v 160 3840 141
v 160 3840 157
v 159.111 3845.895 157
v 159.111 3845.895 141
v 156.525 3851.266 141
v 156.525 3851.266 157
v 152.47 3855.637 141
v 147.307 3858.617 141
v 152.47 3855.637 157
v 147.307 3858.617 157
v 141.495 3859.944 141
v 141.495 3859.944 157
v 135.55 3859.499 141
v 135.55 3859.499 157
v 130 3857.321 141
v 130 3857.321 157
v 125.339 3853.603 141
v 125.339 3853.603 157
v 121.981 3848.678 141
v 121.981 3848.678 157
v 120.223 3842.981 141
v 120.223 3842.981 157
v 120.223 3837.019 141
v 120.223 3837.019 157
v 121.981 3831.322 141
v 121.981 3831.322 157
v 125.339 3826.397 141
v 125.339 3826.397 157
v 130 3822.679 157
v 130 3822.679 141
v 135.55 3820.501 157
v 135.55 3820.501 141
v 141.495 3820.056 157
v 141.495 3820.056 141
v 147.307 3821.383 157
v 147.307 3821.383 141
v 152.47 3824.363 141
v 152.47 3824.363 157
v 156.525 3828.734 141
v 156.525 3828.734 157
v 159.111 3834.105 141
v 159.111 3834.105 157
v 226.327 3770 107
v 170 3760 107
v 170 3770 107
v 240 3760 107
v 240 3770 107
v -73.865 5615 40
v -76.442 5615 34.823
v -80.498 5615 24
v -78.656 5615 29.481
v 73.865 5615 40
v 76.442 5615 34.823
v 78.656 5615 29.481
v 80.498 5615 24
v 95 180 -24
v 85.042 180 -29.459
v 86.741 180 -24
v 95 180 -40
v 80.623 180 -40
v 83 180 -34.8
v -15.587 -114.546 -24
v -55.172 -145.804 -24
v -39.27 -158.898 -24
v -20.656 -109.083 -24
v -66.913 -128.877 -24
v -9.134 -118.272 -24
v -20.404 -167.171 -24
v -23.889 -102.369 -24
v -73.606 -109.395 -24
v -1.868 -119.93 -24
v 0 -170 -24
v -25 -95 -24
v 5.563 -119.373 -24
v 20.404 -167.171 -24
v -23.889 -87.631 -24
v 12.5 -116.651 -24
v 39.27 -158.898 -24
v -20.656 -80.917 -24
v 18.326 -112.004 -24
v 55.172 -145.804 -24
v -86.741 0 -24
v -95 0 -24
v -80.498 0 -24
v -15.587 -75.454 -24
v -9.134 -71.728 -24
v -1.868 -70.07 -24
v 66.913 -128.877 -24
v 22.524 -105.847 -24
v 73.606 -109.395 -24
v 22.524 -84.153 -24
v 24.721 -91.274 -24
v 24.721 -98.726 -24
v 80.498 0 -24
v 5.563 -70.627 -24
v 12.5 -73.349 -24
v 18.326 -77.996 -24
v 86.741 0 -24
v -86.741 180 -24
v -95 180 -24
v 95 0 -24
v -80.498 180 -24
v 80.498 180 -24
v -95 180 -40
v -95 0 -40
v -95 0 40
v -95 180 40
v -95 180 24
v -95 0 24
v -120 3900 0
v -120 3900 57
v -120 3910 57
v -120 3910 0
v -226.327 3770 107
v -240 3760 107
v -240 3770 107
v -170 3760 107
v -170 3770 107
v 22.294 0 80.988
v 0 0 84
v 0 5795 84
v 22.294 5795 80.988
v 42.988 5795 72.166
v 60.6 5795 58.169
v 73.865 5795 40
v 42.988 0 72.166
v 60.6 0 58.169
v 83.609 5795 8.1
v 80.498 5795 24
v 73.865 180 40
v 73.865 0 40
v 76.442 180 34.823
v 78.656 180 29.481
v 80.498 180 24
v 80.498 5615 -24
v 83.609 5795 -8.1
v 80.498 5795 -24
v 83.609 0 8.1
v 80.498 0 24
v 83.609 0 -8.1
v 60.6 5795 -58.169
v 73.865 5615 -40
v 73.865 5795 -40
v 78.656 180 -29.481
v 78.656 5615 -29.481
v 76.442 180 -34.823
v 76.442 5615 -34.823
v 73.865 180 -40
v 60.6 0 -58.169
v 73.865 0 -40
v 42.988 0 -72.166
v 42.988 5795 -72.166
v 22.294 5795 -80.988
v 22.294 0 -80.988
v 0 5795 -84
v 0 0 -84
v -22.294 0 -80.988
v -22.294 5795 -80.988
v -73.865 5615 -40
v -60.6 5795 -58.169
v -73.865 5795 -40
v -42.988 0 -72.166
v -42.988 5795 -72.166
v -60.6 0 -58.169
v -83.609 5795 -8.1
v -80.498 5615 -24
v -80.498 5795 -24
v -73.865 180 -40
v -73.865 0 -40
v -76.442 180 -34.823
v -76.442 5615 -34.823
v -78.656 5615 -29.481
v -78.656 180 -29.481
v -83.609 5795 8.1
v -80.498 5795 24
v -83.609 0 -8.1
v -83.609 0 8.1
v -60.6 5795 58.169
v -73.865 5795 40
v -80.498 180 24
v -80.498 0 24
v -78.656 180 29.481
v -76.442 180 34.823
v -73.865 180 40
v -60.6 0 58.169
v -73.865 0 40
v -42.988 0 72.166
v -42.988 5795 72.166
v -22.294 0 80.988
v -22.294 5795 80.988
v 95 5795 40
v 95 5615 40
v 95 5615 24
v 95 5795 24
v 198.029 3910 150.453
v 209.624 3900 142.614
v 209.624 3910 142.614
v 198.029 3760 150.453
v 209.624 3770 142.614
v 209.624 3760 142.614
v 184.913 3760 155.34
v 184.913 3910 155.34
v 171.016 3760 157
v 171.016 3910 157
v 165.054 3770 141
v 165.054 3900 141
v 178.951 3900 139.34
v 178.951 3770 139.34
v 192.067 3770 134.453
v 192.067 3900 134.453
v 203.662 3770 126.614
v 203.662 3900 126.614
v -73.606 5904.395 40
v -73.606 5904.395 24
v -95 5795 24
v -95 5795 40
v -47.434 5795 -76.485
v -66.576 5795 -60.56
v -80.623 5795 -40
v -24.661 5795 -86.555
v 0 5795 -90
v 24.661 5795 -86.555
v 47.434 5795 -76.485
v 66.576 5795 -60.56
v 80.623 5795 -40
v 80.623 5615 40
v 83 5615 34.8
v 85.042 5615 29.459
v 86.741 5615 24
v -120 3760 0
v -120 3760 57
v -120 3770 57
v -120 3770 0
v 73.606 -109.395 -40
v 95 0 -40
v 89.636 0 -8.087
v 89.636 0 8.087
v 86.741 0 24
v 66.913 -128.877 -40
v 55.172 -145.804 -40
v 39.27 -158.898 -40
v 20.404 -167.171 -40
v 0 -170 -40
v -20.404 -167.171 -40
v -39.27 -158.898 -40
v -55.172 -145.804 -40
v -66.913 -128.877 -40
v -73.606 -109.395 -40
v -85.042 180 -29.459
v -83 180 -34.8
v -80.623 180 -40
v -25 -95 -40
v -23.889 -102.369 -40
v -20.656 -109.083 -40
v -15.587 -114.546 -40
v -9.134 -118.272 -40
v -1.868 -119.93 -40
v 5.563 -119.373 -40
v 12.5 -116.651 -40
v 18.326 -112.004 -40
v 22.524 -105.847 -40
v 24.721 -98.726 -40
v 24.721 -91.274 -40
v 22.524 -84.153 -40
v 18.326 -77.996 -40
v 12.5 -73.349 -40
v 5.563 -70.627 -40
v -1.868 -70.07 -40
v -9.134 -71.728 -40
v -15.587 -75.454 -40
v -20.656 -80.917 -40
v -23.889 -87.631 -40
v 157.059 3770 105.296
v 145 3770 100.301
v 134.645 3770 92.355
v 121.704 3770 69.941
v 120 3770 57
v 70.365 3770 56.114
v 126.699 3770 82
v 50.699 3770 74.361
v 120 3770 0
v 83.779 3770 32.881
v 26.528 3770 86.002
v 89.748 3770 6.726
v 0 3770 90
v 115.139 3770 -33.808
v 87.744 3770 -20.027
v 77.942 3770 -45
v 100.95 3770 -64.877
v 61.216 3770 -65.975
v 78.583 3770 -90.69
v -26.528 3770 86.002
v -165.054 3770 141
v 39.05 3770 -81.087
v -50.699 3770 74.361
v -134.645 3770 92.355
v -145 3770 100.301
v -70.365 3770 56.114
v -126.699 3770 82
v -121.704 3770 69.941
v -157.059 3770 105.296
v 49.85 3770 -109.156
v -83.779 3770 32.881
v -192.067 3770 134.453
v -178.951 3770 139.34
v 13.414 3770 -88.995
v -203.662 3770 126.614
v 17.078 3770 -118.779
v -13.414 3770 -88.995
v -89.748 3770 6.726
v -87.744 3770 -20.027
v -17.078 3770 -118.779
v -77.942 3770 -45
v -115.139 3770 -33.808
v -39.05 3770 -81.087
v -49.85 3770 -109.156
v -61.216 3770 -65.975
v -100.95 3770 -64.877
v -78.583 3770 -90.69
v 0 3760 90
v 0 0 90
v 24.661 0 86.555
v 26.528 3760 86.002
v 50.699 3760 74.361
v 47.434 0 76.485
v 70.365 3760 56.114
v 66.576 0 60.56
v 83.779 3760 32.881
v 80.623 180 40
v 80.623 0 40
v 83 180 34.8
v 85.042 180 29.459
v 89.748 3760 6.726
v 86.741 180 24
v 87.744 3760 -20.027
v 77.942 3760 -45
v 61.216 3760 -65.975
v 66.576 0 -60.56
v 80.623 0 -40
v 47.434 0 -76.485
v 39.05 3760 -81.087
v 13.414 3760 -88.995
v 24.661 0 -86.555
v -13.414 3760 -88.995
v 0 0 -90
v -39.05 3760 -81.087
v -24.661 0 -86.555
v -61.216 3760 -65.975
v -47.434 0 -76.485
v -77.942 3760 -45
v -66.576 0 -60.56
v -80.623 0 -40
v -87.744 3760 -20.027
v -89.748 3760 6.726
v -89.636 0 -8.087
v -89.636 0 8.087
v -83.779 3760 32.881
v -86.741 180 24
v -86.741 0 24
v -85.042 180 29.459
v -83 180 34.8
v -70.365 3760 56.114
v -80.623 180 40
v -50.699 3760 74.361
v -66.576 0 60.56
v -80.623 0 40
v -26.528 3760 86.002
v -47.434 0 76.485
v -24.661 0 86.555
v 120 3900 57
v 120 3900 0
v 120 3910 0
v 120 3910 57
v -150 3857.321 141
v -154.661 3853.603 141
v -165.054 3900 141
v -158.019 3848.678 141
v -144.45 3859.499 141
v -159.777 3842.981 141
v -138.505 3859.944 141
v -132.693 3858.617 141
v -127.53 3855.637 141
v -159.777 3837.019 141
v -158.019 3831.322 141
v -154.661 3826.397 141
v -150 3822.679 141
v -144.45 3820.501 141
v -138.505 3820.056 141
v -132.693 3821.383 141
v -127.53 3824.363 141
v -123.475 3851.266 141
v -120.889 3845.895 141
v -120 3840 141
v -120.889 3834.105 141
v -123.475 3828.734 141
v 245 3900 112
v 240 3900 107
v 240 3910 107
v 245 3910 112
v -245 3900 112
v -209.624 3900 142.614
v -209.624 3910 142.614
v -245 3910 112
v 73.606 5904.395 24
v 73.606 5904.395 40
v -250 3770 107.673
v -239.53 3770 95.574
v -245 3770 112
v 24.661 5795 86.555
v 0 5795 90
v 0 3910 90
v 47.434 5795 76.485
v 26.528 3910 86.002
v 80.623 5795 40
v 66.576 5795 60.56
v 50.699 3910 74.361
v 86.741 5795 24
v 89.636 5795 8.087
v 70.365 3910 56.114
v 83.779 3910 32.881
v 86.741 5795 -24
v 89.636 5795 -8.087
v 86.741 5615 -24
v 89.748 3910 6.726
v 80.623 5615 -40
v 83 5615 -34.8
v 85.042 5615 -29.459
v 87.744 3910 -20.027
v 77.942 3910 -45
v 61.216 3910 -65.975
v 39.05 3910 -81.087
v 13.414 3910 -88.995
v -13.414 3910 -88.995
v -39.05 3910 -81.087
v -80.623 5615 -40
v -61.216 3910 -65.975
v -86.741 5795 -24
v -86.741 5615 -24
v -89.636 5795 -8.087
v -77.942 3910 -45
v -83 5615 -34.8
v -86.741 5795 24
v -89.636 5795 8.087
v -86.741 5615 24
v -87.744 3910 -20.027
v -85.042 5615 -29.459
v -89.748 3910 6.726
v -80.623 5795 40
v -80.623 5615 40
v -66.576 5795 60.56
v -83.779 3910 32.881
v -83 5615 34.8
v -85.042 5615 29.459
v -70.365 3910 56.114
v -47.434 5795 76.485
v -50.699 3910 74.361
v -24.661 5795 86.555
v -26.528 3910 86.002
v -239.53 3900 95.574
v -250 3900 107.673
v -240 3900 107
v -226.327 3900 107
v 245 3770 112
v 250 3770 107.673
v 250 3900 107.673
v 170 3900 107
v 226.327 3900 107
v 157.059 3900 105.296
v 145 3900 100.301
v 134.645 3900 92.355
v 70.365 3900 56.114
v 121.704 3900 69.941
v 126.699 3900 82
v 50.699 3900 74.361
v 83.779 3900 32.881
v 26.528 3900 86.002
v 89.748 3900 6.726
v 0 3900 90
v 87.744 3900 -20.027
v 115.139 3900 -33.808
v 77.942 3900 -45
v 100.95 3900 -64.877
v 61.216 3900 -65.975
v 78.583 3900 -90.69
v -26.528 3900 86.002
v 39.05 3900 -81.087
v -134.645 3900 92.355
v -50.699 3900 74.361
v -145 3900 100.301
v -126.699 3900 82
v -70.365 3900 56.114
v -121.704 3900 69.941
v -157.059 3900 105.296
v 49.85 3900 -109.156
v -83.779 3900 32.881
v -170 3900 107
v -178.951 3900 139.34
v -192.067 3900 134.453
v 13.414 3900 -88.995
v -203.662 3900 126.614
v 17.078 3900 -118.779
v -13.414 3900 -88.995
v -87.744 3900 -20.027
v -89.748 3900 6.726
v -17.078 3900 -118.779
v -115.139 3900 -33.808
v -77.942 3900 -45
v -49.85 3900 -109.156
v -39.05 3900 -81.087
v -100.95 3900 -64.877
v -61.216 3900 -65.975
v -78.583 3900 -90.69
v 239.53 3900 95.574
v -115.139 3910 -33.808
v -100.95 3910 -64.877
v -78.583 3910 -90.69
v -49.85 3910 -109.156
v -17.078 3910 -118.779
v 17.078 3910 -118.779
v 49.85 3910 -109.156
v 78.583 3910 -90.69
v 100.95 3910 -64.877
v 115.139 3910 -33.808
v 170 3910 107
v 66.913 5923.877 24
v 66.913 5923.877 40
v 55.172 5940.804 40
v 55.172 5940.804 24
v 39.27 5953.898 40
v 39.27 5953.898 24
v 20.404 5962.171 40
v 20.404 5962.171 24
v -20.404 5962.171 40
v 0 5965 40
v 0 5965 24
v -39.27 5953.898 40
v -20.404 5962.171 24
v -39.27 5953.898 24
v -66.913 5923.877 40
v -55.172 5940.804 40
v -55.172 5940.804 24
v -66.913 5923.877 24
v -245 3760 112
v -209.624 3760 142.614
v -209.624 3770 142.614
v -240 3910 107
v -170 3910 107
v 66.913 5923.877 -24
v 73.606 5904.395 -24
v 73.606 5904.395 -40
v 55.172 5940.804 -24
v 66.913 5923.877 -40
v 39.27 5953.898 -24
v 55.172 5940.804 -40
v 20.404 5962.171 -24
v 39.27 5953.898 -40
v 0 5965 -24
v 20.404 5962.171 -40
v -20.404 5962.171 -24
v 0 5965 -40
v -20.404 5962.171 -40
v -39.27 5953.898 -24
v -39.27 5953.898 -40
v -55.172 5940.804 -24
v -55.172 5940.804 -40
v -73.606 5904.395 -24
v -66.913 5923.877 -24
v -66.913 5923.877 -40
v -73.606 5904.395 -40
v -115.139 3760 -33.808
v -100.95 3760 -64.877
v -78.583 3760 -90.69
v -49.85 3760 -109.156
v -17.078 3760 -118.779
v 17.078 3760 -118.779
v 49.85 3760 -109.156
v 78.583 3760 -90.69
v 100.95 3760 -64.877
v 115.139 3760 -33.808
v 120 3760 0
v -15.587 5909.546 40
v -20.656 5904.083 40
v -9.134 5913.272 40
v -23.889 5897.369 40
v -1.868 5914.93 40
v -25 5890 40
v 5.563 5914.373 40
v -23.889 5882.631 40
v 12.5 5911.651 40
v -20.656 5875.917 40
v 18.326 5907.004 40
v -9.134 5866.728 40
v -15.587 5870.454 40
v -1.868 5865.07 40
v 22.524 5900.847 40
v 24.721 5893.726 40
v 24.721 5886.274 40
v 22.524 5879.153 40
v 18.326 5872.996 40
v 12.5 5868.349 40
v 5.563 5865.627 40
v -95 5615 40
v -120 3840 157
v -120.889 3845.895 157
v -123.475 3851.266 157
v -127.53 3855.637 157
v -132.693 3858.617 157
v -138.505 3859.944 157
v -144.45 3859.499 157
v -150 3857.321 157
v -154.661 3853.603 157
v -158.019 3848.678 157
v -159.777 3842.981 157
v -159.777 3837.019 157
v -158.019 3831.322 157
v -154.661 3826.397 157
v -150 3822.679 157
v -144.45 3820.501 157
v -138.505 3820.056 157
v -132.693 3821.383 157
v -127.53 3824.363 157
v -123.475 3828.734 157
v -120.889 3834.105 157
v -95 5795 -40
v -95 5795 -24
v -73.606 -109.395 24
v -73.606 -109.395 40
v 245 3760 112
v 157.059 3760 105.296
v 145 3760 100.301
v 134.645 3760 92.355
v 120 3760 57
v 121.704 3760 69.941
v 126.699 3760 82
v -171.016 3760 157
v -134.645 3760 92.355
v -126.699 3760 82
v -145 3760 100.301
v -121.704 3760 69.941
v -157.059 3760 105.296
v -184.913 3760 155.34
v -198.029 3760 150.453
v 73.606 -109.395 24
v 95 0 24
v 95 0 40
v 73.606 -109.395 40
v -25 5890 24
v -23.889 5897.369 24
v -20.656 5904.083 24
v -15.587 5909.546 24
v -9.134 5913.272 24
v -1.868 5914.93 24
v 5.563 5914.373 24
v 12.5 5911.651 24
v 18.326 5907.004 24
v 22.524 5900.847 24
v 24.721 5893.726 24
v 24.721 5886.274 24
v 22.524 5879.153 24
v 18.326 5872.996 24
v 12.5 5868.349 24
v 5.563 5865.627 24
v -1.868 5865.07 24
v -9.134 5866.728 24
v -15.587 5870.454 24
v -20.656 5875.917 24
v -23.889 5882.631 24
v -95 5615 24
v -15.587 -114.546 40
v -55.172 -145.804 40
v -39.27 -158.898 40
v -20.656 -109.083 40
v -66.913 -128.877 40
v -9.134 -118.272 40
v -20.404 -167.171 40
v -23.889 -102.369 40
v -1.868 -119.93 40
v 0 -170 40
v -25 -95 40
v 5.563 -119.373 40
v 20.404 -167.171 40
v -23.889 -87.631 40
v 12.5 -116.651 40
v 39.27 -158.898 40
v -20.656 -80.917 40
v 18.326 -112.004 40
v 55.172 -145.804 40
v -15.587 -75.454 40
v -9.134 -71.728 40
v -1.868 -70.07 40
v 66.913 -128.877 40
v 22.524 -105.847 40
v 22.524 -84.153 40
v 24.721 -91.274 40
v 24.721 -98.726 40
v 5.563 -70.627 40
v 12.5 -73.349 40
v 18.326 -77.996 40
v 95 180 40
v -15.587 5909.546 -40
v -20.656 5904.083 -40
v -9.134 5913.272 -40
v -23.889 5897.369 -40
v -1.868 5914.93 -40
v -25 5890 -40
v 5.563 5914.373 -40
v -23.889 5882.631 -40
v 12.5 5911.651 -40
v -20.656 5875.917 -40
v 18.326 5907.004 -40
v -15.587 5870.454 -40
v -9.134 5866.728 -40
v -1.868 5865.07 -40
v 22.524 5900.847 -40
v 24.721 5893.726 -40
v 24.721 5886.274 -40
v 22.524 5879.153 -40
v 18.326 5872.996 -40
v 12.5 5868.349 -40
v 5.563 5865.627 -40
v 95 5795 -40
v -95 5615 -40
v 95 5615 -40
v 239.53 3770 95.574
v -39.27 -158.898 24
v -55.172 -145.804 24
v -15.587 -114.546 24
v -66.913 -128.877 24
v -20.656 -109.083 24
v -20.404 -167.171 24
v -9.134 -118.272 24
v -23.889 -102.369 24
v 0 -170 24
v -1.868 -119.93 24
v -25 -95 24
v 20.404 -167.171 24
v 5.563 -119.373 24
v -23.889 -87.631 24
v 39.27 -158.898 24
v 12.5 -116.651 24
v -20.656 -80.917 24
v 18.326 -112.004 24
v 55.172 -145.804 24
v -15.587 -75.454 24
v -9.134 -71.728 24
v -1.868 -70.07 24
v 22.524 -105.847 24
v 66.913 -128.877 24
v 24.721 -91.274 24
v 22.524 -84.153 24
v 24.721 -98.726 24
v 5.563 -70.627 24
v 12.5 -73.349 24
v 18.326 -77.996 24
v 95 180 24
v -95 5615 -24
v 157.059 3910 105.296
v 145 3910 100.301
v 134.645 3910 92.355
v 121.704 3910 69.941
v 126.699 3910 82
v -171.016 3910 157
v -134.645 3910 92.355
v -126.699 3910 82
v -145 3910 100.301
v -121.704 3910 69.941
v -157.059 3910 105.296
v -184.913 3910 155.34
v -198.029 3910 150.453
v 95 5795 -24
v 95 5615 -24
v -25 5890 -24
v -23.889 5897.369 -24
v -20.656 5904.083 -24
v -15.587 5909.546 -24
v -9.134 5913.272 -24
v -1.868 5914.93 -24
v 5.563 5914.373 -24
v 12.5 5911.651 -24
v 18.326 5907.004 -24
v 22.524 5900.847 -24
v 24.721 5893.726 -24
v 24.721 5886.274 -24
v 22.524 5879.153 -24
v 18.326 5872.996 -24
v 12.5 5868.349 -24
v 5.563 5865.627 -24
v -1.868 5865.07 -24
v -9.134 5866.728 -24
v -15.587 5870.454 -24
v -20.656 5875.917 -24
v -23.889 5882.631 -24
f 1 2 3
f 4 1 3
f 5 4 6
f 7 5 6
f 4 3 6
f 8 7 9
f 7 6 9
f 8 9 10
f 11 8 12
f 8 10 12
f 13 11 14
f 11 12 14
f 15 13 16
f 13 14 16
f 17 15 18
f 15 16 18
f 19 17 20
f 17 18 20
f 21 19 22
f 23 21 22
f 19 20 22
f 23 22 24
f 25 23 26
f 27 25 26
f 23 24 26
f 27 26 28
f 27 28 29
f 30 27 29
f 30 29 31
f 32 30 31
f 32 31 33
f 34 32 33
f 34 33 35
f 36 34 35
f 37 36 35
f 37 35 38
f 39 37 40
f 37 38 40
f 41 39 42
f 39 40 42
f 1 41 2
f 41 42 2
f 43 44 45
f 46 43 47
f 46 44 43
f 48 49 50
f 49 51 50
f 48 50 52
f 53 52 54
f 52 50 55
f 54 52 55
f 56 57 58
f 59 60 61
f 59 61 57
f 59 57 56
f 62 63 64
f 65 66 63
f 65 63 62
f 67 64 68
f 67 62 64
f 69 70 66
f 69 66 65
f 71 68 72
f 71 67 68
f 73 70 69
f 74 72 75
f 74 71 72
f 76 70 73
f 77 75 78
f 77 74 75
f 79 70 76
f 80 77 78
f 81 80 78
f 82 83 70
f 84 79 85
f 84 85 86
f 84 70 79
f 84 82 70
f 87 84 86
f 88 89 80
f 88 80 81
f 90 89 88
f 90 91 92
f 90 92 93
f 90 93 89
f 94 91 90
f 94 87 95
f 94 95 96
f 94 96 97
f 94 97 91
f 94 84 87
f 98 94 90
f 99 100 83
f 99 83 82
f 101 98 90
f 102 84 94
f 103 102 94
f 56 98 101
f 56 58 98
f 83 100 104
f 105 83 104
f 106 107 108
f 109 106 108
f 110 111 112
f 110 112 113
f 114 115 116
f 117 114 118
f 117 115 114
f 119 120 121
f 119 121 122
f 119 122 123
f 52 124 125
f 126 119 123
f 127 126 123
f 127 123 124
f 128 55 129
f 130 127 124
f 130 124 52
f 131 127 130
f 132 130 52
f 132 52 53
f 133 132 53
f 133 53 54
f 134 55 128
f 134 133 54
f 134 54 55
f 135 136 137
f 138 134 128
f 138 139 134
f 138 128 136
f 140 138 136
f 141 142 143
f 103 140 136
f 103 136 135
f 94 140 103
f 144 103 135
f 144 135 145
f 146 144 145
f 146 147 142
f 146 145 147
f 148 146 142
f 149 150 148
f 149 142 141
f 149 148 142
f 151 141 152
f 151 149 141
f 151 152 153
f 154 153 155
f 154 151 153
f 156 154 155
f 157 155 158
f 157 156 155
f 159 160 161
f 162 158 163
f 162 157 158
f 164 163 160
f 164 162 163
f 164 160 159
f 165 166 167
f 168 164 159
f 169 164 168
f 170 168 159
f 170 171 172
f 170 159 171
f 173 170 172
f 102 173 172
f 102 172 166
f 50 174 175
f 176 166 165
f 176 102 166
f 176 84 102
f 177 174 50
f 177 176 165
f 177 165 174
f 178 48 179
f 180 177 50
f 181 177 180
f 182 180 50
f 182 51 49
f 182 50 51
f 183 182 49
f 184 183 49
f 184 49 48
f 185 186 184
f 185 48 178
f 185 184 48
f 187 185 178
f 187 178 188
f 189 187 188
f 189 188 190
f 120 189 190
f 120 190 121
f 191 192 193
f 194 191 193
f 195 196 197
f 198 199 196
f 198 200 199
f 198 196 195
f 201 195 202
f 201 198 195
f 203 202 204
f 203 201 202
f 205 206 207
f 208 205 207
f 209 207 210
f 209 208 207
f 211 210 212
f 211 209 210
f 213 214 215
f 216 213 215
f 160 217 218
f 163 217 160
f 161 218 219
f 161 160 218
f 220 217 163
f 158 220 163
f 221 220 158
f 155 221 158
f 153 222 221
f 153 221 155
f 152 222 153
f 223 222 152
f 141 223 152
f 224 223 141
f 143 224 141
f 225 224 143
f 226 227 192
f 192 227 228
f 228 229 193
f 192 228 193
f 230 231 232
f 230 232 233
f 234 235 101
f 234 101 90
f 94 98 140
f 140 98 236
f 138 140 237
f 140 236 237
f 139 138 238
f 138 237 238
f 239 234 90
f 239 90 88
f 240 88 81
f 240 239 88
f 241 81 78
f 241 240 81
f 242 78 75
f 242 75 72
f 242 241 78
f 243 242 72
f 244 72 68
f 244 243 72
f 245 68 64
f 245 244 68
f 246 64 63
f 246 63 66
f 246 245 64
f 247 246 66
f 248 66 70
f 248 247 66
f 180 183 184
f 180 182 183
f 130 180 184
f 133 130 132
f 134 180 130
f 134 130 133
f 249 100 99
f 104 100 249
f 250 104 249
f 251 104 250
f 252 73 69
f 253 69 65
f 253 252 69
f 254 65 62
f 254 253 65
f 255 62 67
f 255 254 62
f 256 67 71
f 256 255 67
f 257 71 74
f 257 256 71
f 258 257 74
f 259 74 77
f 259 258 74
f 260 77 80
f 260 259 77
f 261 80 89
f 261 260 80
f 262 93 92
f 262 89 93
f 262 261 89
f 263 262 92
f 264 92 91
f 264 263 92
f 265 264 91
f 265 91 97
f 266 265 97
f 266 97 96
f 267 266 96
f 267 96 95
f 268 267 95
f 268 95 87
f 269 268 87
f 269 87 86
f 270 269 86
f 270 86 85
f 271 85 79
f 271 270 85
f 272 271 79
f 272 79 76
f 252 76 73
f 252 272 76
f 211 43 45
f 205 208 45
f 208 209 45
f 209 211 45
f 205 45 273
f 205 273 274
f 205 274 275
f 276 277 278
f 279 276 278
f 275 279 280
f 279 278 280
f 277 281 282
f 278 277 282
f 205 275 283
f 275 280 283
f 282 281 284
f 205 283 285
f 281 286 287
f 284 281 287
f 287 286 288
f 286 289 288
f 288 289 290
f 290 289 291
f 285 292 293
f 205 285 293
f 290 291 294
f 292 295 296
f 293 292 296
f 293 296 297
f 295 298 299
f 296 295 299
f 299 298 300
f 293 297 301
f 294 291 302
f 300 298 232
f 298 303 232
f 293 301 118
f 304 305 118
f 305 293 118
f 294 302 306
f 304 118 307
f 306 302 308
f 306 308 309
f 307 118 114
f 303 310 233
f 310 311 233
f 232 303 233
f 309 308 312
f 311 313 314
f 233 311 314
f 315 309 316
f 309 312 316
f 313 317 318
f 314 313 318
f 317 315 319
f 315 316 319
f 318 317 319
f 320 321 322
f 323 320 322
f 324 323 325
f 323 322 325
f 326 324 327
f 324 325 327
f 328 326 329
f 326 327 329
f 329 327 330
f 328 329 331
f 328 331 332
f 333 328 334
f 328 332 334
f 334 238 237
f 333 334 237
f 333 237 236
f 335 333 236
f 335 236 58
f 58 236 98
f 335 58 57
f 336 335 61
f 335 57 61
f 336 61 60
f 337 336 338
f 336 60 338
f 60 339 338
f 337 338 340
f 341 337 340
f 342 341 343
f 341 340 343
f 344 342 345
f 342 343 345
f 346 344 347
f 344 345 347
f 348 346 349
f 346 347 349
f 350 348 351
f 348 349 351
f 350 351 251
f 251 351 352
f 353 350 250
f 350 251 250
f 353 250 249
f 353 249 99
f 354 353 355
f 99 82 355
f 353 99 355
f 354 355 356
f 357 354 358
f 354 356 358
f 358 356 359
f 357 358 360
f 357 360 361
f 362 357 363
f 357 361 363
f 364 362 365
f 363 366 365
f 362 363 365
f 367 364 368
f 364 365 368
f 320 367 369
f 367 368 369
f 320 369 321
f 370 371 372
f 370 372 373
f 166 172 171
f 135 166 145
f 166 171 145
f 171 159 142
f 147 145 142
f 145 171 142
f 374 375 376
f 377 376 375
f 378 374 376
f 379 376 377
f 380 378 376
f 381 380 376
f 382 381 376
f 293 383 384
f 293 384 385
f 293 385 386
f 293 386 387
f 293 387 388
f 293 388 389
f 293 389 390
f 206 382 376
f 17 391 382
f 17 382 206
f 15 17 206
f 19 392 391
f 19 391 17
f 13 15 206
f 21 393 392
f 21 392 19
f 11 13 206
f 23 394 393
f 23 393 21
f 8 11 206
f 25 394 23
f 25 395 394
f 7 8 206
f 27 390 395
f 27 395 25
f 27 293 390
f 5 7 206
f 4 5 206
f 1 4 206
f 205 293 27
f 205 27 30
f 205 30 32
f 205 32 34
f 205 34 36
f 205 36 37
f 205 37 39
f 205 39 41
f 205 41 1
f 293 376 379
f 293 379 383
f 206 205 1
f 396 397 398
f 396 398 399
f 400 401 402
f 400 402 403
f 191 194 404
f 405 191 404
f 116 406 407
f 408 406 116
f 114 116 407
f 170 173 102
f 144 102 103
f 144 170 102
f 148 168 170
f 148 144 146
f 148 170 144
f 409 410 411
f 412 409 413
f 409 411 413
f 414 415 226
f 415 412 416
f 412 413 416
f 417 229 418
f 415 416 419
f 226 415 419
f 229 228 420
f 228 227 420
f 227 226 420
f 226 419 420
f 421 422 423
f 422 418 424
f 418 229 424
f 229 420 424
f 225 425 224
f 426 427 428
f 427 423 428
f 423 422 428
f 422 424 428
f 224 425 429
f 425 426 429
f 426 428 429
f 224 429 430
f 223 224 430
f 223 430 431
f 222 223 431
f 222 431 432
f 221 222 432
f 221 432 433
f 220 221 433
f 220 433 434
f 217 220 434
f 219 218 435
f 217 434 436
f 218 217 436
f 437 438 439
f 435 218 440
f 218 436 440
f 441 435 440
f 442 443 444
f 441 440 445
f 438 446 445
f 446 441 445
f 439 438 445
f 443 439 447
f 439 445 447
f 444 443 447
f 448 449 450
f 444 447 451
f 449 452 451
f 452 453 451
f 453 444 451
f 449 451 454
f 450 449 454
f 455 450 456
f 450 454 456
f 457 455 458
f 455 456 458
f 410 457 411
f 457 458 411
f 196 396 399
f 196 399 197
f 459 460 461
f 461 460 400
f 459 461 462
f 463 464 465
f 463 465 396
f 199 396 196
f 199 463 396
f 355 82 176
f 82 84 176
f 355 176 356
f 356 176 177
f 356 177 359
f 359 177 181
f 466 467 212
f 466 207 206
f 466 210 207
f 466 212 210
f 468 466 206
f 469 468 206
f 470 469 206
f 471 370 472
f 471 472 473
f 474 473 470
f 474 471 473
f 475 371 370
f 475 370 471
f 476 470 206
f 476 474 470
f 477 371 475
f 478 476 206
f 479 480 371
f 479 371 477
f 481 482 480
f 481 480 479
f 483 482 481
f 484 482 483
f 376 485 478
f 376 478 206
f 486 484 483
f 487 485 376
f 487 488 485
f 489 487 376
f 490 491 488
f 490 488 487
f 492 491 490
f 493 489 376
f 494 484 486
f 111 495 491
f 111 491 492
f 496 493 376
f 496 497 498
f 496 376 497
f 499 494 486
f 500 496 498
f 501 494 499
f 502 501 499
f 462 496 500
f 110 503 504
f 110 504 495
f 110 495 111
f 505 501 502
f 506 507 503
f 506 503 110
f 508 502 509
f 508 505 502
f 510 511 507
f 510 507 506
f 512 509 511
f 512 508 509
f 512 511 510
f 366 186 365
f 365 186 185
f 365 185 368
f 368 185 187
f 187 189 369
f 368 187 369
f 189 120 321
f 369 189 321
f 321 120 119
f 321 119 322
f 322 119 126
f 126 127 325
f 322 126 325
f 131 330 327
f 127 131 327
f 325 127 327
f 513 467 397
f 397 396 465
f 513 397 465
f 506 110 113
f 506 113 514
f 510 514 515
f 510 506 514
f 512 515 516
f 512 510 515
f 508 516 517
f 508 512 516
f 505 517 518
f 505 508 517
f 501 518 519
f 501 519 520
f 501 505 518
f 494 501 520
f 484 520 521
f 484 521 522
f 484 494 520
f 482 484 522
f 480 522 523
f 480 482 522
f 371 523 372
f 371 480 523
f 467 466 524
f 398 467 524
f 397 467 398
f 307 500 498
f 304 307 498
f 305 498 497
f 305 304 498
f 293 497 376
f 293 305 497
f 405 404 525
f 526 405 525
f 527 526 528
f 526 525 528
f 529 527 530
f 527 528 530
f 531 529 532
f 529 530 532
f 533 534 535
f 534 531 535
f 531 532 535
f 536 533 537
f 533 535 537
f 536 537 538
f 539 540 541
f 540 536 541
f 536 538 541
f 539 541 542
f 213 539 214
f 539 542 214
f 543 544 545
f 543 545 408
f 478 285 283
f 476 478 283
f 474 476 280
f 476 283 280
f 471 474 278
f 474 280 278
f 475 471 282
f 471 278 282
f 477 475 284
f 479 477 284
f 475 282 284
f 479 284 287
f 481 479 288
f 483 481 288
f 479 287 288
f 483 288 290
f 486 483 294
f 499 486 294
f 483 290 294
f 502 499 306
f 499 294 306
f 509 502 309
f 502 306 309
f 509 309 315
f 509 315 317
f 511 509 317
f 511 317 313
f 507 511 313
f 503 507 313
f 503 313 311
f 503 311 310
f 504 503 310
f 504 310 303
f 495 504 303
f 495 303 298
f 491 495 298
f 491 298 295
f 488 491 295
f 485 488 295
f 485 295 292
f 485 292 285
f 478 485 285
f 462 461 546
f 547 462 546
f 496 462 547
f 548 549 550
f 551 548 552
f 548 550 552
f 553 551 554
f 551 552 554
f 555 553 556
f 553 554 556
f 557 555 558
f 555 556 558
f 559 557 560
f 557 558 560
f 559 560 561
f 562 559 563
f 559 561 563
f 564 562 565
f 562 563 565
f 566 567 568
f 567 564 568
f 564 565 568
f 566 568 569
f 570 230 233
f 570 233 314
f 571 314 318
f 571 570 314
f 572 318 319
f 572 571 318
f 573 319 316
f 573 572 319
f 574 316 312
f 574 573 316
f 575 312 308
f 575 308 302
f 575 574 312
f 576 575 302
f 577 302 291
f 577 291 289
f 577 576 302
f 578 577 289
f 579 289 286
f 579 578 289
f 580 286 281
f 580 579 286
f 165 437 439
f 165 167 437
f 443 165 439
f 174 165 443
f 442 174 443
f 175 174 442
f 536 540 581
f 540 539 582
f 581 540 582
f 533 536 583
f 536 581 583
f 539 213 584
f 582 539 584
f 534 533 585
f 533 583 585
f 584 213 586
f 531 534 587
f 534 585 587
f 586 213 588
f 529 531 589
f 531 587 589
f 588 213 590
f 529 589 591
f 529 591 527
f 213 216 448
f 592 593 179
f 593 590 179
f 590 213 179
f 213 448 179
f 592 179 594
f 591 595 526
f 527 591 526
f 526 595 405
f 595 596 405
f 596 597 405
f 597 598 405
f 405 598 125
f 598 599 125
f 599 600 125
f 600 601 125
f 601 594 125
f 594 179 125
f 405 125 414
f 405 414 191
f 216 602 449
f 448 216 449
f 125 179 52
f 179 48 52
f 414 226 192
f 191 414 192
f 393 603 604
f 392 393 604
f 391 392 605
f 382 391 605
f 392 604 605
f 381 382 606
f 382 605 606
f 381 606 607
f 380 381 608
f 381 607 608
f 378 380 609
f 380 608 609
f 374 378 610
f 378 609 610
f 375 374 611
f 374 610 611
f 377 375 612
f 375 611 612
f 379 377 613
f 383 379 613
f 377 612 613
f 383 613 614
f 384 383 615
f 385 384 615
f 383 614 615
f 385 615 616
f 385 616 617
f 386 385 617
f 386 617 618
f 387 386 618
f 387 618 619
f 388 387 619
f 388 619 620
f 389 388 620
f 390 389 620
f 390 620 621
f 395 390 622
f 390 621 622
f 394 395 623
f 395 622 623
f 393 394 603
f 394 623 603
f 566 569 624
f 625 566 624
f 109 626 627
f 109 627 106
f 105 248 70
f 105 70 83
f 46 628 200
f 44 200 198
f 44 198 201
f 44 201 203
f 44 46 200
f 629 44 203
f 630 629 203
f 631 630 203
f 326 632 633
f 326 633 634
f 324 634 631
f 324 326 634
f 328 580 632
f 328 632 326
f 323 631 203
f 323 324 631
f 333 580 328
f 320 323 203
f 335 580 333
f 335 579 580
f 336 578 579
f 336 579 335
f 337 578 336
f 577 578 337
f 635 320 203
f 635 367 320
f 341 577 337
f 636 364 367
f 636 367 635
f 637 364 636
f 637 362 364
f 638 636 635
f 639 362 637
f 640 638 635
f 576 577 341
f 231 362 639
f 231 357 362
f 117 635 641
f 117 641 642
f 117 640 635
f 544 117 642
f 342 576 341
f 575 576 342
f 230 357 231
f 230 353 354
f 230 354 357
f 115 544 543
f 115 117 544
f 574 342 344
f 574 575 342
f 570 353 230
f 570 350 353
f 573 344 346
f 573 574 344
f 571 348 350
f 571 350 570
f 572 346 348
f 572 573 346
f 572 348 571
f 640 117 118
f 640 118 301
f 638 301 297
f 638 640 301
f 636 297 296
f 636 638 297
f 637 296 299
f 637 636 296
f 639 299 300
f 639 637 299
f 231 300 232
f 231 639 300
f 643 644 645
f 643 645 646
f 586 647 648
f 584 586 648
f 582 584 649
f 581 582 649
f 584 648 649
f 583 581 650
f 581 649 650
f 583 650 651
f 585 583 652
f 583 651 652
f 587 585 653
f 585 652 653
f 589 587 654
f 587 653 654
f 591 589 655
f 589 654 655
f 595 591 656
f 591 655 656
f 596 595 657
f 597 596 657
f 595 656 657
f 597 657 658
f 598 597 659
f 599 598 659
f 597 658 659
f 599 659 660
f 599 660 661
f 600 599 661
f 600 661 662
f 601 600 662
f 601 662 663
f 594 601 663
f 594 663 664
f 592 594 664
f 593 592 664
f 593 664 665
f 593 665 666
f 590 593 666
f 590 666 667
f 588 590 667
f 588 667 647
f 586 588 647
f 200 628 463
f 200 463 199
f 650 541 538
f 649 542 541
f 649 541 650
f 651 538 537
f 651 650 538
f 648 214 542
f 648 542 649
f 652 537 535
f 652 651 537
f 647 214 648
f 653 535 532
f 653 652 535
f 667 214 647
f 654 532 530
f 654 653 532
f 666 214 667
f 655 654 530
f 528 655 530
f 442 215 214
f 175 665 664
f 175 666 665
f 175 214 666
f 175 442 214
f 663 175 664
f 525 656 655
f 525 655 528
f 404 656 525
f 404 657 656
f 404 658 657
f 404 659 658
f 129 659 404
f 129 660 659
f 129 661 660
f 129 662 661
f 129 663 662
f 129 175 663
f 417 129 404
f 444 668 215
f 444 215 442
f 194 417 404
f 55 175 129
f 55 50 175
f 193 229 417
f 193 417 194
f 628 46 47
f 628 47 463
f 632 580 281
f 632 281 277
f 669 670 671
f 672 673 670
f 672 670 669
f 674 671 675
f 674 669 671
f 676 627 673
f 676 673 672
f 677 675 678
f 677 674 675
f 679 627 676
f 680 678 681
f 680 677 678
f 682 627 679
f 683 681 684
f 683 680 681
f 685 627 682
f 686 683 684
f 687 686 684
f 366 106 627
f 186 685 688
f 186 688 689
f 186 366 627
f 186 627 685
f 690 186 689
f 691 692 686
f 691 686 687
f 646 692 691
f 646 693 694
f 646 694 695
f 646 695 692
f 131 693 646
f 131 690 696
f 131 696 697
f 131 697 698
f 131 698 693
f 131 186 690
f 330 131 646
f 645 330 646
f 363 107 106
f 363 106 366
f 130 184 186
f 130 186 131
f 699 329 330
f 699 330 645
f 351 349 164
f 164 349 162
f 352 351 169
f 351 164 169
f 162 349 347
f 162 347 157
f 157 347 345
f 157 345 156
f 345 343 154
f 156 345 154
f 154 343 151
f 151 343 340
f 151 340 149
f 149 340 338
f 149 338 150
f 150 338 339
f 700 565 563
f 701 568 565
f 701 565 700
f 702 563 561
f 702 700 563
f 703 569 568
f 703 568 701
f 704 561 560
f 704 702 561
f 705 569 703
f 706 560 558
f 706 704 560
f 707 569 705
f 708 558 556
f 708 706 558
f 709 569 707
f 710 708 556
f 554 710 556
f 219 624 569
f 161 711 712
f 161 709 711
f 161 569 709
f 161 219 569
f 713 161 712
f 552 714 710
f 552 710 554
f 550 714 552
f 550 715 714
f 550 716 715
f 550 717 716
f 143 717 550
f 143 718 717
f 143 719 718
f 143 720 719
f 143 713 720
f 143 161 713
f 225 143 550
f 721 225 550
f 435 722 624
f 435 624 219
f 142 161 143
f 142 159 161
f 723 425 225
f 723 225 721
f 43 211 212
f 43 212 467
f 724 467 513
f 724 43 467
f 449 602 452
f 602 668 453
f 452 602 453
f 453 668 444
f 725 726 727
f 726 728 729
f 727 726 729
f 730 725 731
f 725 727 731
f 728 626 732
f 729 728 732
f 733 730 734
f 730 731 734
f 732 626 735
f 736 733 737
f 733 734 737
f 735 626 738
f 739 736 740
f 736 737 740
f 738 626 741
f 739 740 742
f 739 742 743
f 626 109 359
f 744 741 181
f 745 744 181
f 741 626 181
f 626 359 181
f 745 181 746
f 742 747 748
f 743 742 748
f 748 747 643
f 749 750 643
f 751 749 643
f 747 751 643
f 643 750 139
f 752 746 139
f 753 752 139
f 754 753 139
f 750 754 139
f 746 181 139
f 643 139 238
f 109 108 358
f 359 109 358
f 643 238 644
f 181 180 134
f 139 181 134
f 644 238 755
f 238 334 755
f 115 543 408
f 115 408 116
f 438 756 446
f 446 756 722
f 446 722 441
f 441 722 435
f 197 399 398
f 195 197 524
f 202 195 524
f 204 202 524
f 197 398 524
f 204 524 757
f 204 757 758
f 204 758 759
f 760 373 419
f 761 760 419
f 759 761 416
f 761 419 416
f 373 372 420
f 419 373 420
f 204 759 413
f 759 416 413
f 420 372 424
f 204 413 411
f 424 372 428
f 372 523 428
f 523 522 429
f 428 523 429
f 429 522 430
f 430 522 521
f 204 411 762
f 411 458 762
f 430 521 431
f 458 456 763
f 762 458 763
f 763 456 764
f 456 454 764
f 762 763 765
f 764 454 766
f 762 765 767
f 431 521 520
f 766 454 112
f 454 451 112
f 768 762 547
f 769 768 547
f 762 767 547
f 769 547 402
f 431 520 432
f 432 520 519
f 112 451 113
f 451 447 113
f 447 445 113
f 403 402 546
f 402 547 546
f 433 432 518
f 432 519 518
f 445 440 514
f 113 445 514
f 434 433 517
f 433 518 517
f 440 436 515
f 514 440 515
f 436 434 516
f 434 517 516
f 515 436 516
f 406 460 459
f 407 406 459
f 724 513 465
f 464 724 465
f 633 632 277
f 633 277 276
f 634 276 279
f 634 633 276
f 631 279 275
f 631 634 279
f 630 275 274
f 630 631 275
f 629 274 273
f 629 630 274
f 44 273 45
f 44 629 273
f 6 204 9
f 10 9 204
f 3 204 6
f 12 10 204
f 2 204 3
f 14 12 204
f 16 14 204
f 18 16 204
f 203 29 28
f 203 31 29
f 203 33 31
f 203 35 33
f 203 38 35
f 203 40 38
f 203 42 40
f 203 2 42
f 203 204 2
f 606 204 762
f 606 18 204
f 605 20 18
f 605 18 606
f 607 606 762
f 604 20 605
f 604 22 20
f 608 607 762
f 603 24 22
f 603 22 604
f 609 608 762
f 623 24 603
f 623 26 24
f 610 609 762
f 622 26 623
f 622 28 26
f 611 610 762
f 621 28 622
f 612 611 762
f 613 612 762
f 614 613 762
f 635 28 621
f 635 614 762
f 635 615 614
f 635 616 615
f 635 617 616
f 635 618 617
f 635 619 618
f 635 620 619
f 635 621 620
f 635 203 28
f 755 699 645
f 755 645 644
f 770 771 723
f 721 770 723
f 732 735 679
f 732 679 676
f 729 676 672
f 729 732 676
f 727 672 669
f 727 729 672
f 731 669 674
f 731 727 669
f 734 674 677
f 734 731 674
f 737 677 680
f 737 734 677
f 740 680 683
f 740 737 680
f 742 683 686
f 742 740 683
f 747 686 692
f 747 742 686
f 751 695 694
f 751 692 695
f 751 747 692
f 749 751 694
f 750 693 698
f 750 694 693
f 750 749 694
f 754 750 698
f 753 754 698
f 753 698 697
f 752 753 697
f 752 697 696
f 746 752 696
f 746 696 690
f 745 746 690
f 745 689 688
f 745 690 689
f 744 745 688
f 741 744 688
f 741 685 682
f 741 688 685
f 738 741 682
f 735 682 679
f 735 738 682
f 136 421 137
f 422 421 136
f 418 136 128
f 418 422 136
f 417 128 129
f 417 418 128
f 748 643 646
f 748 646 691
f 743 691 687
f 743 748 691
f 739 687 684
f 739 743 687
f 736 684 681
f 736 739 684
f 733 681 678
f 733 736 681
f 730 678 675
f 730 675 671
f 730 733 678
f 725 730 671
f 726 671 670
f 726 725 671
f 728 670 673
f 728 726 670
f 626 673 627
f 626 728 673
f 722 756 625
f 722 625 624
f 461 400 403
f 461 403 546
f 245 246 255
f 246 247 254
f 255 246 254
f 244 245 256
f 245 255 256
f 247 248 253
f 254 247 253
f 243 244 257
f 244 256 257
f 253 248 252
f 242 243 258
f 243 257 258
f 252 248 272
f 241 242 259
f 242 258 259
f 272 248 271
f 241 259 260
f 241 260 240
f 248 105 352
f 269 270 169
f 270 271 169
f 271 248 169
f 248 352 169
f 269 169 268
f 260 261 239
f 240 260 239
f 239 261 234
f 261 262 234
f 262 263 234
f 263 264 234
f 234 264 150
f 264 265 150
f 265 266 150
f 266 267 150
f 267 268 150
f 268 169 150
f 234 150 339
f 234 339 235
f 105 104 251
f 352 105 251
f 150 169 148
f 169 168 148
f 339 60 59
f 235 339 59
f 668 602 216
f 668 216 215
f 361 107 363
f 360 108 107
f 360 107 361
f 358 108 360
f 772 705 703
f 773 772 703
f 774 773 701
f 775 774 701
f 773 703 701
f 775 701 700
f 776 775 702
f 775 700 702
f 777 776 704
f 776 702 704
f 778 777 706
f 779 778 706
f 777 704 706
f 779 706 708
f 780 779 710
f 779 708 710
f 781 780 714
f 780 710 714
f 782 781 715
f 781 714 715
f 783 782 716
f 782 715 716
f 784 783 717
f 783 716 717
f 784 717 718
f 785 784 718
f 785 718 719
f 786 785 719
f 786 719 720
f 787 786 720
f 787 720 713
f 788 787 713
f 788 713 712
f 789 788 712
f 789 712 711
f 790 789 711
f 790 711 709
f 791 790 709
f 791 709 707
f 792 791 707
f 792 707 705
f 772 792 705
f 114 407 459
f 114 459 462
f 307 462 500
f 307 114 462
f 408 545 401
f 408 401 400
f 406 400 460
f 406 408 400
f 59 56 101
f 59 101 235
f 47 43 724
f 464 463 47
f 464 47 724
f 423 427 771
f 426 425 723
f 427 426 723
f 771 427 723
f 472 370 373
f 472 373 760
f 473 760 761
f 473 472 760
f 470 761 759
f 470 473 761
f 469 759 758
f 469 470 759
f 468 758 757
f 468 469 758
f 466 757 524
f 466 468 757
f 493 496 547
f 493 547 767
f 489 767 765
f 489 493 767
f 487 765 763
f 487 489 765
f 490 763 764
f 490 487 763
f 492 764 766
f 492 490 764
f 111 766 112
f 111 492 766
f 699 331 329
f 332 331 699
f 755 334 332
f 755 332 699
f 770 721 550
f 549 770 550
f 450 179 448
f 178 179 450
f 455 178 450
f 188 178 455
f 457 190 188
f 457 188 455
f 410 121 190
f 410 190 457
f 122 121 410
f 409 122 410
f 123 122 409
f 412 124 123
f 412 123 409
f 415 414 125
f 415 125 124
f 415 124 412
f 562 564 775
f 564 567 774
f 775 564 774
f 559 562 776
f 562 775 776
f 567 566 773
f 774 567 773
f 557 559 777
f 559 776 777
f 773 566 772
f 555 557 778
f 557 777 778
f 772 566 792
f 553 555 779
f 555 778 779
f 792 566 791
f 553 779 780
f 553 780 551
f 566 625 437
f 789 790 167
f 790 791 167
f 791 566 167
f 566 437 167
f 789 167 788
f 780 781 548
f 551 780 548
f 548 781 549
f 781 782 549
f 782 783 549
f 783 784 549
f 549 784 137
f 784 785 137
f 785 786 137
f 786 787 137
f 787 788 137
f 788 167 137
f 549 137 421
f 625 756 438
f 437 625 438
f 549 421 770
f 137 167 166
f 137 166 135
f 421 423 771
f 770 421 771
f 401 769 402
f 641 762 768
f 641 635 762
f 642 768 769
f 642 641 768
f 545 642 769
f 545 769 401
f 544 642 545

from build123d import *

# Parameters (mm, degrees)
SKETCH_1_R             = 90
SKETCH_1_R_2           = 84
EXTRUDE_1_DEPTH        = 5795
SKETCH_2_W             = 180
SKETCH_2_H             = 16
CUT_EXTRUDE_1_DEPTH    = 180
SKETCH_3_W             = 190
SKETCH_3_H             = 16
EXTRUDE_2_DEPTH        = 400
SKETCH_4_R             = 25
CUT_EXTRUDE_2_DEPTH    = 6018.154643185
SKETCH_5_R             = 90
EXTRUDE_3_DEPTH        = 10
PATTERN_LINEAR_1_COUNT = 2
PATTERN_LINEAR_1_PITCH = 140
EXTRUDE_START          = 130
EXTRUDE_4_DEPTH        = 130
SKETCH_7_R             = 20
CUT_EXTRUDE_3_DEPTH    = 16


with BuildPart() as part:
    # 草图1 → 凸台-拉伸1 (new body)
    with BuildSketch(Plane(origin=(0, 0, 0), x_dir=(1, 0, 0), z_dir=(0, 1, 0))):
        with Locations(Location((0, 0, 0), (0, 0, 270))):
            Circle(SKETCH_1_R)
        with Locations(Location((0, 0, 0), (0, 0, 270))):
            Circle(SKETCH_1_R_2, mode=Mode.SUBTRACT)
    extrude(amount=EXTRUDE_1_DEPTH)

    # 草图2 → 切除-拉伸1 (cut)
    with BuildSketch(Plane(origin=(0, 5795, 0), x_dir=(1, 0, 0), z_dir=(0, 1, 0))):
        with Locations((0, 32)):
            Rectangle(SKETCH_2_W, SKETCH_2_H)
        with Locations((0, -32)):
            Rectangle(SKETCH_2_W, SKETCH_2_H)
    cut_extrude_1 = extrude(amount=-CUT_EXTRUDE_1_DEPTH, mode=Mode.SUBTRACT)

    # 草图3 → 凸台-拉伸2 (add)
    with BuildSketch(Plane(origin=(0, 5615, 0), x_dir=(1, 0, 0), z_dir=(0, 1, 0))):
        with Locations((0, 32)):
            Rectangle(SKETCH_3_W, SKETCH_3_H)
        with Locations((0, -32)):
            Rectangle(SKETCH_3_W, SKETCH_3_H)
    extrude_2 = extrude(amount=EXTRUDE_2_DEPTH)

    # 草图4 → 切除-拉伸2 (cut, through all)
    with BuildSketch(Plane(origin=(0, 0, -40), x_dir=(-1, 0, 0), z_dir=(0, 0, -1))):
        with Locations((0, 5890)):
            Circle(SKETCH_4_R)
        with BuildLine():
            Line((95, 5795), (95, 6015))
            Line((95, 6015), (-95, 6015))
            Line((-95, 6015), (-95, 5795))
            Line((-95, 5795), (-73.605585808, 5904.395059493))
            ThreePointArc((-73.605585808, 5904.395059493), (0, 5965), (73.605585808, 5904.395059493))
            Line((73.605585808, 5904.395059493), (95, 5795))
        make_face()
    cut_extrude_2 = extrude(amount=-CUT_EXTRUDE_2_DEPTH, mode=Mode.SUBTRACT)

    # 镜向1: 切除-拉伸1, 凸台-拉伸2, 切除-拉伸2 across plane
    add(cut_extrude_1.mirror(Plane.ZX.offset(2897.5)), mode=Mode.SUBTRACT)
    add(extrude_2.mirror(Plane.ZX.offset(2897.5)))
    add(cut_extrude_2.mirror(Plane.ZX.offset(2897.5)), mode=Mode.SUBTRACT)

    # 草图5 → 凸台-拉伸3 (add)
    with BuildSketch(Plane(origin=(0, 3760, 0), x_dir=(1, 0, 0), z_dir=(0, 1, 0))):
        with BuildLine():
            Line((170, -107), (240, -107))
            Line((240, -107), (245, -112))
            Line((245, -112), (209.623877382, -142.613952265))
            ThreePointArc((209.623877382, -142.613952265), (191.616338968, -153.286631222), (171.01564946, -157))
            Line((171.01564946, -157), (-171.01564946, -157))
            ThreePointArc((-171.01564946, -157), (-191.616338968, -153.286631222), (-209.623877382, -142.613952265))
            Line((-209.623877382, -142.613952265), (-245, -112))
            Line((-245, -112), (-240, -107))
            Line((-240, -107), (-170, -107))
            ThreePointArc((-170, -107), (-134.644660941, -92.355339059), (-120, -57))
            Line((-120, -57), (-120, 0))
            ThreePointArc((-120, 0), (0, 120), (120, 0))
            Line((120, 0), (120, -57))
            ThreePointArc((120, -57), (134.644660941, -92.355339059), (170, -107))
        make_face()
        with Locations(Location((0, 0, 0), (0, 0, 90))):
            Circle(SKETCH_5_R, mode=Mode.SUBTRACT)
    extrude_3 = extrude(amount=EXTRUDE_3_DEPTH)

    # 阵列(线性)1: 凸台-拉伸3 ×2
    with Locations(*[(0, i * PATTERN_LINEAR_1_PITCH, 0) for i in range(1, PATTERN_LINEAR_1_COUNT)]):
        add(extrude_3)

    # 草图6 → 凸台-拉伸4 (add)
    with BuildSketch(Plane.XZ.offset(-3900).offset(EXTRUDE_START)):
        with BuildLine():
            Line((-250, 107.673076923), (-239.529972089, 95.574378004))
            Line((-239.529972089, 95.574378004), (-203.662019609, 126.613952265))
            ThreePointArc((-203.662019609, 126.613952265), (-185.654481194, 137.286631222), (-165.053791687, 141))
            Line((-165.053791687, 141), (165.053791687, 141))
            ThreePointArc((165.053791687, 141), (185.654481194, 137.286631222), (203.662019609, 126.613952265))
            Line((203.662019609, 126.613952265), (239.529972089, 95.574378004))
            Line((239.529972089, 95.574378004), (250, 107.673076923))
            Line((250, 107.673076923), (209.623877382, 142.613952265))
            ThreePointArc((209.623877382, 142.613952265), (191.616338968, 153.286631222), (171.01564946, 157))
            Line((171.01564946, 157), (-171.01564946, 157))
            ThreePointArc((-171.01564946, 157), (-191.616338968, 153.286631222), (-209.623877382, 142.613952265))
            Line((-209.623877382, 142.613952265), (-250, 107.673076923))
        make_face()
    extrude(amount=-EXTRUDE_4_DEPTH)

    # 草图7 → 切除-拉伸3 (cut)
    with BuildSketch(Plane.XY.offset(157)):
        with Locations((-140, 3840)):
            Circle(SKETCH_7_R)
        with Locations((140, 3840)):
            Circle(SKETCH_7_R)
    extrude(amount=-CUT_EXTRUDE_3_DEPTH, mode=Mode.SUBTRACT)


solid = part.part
